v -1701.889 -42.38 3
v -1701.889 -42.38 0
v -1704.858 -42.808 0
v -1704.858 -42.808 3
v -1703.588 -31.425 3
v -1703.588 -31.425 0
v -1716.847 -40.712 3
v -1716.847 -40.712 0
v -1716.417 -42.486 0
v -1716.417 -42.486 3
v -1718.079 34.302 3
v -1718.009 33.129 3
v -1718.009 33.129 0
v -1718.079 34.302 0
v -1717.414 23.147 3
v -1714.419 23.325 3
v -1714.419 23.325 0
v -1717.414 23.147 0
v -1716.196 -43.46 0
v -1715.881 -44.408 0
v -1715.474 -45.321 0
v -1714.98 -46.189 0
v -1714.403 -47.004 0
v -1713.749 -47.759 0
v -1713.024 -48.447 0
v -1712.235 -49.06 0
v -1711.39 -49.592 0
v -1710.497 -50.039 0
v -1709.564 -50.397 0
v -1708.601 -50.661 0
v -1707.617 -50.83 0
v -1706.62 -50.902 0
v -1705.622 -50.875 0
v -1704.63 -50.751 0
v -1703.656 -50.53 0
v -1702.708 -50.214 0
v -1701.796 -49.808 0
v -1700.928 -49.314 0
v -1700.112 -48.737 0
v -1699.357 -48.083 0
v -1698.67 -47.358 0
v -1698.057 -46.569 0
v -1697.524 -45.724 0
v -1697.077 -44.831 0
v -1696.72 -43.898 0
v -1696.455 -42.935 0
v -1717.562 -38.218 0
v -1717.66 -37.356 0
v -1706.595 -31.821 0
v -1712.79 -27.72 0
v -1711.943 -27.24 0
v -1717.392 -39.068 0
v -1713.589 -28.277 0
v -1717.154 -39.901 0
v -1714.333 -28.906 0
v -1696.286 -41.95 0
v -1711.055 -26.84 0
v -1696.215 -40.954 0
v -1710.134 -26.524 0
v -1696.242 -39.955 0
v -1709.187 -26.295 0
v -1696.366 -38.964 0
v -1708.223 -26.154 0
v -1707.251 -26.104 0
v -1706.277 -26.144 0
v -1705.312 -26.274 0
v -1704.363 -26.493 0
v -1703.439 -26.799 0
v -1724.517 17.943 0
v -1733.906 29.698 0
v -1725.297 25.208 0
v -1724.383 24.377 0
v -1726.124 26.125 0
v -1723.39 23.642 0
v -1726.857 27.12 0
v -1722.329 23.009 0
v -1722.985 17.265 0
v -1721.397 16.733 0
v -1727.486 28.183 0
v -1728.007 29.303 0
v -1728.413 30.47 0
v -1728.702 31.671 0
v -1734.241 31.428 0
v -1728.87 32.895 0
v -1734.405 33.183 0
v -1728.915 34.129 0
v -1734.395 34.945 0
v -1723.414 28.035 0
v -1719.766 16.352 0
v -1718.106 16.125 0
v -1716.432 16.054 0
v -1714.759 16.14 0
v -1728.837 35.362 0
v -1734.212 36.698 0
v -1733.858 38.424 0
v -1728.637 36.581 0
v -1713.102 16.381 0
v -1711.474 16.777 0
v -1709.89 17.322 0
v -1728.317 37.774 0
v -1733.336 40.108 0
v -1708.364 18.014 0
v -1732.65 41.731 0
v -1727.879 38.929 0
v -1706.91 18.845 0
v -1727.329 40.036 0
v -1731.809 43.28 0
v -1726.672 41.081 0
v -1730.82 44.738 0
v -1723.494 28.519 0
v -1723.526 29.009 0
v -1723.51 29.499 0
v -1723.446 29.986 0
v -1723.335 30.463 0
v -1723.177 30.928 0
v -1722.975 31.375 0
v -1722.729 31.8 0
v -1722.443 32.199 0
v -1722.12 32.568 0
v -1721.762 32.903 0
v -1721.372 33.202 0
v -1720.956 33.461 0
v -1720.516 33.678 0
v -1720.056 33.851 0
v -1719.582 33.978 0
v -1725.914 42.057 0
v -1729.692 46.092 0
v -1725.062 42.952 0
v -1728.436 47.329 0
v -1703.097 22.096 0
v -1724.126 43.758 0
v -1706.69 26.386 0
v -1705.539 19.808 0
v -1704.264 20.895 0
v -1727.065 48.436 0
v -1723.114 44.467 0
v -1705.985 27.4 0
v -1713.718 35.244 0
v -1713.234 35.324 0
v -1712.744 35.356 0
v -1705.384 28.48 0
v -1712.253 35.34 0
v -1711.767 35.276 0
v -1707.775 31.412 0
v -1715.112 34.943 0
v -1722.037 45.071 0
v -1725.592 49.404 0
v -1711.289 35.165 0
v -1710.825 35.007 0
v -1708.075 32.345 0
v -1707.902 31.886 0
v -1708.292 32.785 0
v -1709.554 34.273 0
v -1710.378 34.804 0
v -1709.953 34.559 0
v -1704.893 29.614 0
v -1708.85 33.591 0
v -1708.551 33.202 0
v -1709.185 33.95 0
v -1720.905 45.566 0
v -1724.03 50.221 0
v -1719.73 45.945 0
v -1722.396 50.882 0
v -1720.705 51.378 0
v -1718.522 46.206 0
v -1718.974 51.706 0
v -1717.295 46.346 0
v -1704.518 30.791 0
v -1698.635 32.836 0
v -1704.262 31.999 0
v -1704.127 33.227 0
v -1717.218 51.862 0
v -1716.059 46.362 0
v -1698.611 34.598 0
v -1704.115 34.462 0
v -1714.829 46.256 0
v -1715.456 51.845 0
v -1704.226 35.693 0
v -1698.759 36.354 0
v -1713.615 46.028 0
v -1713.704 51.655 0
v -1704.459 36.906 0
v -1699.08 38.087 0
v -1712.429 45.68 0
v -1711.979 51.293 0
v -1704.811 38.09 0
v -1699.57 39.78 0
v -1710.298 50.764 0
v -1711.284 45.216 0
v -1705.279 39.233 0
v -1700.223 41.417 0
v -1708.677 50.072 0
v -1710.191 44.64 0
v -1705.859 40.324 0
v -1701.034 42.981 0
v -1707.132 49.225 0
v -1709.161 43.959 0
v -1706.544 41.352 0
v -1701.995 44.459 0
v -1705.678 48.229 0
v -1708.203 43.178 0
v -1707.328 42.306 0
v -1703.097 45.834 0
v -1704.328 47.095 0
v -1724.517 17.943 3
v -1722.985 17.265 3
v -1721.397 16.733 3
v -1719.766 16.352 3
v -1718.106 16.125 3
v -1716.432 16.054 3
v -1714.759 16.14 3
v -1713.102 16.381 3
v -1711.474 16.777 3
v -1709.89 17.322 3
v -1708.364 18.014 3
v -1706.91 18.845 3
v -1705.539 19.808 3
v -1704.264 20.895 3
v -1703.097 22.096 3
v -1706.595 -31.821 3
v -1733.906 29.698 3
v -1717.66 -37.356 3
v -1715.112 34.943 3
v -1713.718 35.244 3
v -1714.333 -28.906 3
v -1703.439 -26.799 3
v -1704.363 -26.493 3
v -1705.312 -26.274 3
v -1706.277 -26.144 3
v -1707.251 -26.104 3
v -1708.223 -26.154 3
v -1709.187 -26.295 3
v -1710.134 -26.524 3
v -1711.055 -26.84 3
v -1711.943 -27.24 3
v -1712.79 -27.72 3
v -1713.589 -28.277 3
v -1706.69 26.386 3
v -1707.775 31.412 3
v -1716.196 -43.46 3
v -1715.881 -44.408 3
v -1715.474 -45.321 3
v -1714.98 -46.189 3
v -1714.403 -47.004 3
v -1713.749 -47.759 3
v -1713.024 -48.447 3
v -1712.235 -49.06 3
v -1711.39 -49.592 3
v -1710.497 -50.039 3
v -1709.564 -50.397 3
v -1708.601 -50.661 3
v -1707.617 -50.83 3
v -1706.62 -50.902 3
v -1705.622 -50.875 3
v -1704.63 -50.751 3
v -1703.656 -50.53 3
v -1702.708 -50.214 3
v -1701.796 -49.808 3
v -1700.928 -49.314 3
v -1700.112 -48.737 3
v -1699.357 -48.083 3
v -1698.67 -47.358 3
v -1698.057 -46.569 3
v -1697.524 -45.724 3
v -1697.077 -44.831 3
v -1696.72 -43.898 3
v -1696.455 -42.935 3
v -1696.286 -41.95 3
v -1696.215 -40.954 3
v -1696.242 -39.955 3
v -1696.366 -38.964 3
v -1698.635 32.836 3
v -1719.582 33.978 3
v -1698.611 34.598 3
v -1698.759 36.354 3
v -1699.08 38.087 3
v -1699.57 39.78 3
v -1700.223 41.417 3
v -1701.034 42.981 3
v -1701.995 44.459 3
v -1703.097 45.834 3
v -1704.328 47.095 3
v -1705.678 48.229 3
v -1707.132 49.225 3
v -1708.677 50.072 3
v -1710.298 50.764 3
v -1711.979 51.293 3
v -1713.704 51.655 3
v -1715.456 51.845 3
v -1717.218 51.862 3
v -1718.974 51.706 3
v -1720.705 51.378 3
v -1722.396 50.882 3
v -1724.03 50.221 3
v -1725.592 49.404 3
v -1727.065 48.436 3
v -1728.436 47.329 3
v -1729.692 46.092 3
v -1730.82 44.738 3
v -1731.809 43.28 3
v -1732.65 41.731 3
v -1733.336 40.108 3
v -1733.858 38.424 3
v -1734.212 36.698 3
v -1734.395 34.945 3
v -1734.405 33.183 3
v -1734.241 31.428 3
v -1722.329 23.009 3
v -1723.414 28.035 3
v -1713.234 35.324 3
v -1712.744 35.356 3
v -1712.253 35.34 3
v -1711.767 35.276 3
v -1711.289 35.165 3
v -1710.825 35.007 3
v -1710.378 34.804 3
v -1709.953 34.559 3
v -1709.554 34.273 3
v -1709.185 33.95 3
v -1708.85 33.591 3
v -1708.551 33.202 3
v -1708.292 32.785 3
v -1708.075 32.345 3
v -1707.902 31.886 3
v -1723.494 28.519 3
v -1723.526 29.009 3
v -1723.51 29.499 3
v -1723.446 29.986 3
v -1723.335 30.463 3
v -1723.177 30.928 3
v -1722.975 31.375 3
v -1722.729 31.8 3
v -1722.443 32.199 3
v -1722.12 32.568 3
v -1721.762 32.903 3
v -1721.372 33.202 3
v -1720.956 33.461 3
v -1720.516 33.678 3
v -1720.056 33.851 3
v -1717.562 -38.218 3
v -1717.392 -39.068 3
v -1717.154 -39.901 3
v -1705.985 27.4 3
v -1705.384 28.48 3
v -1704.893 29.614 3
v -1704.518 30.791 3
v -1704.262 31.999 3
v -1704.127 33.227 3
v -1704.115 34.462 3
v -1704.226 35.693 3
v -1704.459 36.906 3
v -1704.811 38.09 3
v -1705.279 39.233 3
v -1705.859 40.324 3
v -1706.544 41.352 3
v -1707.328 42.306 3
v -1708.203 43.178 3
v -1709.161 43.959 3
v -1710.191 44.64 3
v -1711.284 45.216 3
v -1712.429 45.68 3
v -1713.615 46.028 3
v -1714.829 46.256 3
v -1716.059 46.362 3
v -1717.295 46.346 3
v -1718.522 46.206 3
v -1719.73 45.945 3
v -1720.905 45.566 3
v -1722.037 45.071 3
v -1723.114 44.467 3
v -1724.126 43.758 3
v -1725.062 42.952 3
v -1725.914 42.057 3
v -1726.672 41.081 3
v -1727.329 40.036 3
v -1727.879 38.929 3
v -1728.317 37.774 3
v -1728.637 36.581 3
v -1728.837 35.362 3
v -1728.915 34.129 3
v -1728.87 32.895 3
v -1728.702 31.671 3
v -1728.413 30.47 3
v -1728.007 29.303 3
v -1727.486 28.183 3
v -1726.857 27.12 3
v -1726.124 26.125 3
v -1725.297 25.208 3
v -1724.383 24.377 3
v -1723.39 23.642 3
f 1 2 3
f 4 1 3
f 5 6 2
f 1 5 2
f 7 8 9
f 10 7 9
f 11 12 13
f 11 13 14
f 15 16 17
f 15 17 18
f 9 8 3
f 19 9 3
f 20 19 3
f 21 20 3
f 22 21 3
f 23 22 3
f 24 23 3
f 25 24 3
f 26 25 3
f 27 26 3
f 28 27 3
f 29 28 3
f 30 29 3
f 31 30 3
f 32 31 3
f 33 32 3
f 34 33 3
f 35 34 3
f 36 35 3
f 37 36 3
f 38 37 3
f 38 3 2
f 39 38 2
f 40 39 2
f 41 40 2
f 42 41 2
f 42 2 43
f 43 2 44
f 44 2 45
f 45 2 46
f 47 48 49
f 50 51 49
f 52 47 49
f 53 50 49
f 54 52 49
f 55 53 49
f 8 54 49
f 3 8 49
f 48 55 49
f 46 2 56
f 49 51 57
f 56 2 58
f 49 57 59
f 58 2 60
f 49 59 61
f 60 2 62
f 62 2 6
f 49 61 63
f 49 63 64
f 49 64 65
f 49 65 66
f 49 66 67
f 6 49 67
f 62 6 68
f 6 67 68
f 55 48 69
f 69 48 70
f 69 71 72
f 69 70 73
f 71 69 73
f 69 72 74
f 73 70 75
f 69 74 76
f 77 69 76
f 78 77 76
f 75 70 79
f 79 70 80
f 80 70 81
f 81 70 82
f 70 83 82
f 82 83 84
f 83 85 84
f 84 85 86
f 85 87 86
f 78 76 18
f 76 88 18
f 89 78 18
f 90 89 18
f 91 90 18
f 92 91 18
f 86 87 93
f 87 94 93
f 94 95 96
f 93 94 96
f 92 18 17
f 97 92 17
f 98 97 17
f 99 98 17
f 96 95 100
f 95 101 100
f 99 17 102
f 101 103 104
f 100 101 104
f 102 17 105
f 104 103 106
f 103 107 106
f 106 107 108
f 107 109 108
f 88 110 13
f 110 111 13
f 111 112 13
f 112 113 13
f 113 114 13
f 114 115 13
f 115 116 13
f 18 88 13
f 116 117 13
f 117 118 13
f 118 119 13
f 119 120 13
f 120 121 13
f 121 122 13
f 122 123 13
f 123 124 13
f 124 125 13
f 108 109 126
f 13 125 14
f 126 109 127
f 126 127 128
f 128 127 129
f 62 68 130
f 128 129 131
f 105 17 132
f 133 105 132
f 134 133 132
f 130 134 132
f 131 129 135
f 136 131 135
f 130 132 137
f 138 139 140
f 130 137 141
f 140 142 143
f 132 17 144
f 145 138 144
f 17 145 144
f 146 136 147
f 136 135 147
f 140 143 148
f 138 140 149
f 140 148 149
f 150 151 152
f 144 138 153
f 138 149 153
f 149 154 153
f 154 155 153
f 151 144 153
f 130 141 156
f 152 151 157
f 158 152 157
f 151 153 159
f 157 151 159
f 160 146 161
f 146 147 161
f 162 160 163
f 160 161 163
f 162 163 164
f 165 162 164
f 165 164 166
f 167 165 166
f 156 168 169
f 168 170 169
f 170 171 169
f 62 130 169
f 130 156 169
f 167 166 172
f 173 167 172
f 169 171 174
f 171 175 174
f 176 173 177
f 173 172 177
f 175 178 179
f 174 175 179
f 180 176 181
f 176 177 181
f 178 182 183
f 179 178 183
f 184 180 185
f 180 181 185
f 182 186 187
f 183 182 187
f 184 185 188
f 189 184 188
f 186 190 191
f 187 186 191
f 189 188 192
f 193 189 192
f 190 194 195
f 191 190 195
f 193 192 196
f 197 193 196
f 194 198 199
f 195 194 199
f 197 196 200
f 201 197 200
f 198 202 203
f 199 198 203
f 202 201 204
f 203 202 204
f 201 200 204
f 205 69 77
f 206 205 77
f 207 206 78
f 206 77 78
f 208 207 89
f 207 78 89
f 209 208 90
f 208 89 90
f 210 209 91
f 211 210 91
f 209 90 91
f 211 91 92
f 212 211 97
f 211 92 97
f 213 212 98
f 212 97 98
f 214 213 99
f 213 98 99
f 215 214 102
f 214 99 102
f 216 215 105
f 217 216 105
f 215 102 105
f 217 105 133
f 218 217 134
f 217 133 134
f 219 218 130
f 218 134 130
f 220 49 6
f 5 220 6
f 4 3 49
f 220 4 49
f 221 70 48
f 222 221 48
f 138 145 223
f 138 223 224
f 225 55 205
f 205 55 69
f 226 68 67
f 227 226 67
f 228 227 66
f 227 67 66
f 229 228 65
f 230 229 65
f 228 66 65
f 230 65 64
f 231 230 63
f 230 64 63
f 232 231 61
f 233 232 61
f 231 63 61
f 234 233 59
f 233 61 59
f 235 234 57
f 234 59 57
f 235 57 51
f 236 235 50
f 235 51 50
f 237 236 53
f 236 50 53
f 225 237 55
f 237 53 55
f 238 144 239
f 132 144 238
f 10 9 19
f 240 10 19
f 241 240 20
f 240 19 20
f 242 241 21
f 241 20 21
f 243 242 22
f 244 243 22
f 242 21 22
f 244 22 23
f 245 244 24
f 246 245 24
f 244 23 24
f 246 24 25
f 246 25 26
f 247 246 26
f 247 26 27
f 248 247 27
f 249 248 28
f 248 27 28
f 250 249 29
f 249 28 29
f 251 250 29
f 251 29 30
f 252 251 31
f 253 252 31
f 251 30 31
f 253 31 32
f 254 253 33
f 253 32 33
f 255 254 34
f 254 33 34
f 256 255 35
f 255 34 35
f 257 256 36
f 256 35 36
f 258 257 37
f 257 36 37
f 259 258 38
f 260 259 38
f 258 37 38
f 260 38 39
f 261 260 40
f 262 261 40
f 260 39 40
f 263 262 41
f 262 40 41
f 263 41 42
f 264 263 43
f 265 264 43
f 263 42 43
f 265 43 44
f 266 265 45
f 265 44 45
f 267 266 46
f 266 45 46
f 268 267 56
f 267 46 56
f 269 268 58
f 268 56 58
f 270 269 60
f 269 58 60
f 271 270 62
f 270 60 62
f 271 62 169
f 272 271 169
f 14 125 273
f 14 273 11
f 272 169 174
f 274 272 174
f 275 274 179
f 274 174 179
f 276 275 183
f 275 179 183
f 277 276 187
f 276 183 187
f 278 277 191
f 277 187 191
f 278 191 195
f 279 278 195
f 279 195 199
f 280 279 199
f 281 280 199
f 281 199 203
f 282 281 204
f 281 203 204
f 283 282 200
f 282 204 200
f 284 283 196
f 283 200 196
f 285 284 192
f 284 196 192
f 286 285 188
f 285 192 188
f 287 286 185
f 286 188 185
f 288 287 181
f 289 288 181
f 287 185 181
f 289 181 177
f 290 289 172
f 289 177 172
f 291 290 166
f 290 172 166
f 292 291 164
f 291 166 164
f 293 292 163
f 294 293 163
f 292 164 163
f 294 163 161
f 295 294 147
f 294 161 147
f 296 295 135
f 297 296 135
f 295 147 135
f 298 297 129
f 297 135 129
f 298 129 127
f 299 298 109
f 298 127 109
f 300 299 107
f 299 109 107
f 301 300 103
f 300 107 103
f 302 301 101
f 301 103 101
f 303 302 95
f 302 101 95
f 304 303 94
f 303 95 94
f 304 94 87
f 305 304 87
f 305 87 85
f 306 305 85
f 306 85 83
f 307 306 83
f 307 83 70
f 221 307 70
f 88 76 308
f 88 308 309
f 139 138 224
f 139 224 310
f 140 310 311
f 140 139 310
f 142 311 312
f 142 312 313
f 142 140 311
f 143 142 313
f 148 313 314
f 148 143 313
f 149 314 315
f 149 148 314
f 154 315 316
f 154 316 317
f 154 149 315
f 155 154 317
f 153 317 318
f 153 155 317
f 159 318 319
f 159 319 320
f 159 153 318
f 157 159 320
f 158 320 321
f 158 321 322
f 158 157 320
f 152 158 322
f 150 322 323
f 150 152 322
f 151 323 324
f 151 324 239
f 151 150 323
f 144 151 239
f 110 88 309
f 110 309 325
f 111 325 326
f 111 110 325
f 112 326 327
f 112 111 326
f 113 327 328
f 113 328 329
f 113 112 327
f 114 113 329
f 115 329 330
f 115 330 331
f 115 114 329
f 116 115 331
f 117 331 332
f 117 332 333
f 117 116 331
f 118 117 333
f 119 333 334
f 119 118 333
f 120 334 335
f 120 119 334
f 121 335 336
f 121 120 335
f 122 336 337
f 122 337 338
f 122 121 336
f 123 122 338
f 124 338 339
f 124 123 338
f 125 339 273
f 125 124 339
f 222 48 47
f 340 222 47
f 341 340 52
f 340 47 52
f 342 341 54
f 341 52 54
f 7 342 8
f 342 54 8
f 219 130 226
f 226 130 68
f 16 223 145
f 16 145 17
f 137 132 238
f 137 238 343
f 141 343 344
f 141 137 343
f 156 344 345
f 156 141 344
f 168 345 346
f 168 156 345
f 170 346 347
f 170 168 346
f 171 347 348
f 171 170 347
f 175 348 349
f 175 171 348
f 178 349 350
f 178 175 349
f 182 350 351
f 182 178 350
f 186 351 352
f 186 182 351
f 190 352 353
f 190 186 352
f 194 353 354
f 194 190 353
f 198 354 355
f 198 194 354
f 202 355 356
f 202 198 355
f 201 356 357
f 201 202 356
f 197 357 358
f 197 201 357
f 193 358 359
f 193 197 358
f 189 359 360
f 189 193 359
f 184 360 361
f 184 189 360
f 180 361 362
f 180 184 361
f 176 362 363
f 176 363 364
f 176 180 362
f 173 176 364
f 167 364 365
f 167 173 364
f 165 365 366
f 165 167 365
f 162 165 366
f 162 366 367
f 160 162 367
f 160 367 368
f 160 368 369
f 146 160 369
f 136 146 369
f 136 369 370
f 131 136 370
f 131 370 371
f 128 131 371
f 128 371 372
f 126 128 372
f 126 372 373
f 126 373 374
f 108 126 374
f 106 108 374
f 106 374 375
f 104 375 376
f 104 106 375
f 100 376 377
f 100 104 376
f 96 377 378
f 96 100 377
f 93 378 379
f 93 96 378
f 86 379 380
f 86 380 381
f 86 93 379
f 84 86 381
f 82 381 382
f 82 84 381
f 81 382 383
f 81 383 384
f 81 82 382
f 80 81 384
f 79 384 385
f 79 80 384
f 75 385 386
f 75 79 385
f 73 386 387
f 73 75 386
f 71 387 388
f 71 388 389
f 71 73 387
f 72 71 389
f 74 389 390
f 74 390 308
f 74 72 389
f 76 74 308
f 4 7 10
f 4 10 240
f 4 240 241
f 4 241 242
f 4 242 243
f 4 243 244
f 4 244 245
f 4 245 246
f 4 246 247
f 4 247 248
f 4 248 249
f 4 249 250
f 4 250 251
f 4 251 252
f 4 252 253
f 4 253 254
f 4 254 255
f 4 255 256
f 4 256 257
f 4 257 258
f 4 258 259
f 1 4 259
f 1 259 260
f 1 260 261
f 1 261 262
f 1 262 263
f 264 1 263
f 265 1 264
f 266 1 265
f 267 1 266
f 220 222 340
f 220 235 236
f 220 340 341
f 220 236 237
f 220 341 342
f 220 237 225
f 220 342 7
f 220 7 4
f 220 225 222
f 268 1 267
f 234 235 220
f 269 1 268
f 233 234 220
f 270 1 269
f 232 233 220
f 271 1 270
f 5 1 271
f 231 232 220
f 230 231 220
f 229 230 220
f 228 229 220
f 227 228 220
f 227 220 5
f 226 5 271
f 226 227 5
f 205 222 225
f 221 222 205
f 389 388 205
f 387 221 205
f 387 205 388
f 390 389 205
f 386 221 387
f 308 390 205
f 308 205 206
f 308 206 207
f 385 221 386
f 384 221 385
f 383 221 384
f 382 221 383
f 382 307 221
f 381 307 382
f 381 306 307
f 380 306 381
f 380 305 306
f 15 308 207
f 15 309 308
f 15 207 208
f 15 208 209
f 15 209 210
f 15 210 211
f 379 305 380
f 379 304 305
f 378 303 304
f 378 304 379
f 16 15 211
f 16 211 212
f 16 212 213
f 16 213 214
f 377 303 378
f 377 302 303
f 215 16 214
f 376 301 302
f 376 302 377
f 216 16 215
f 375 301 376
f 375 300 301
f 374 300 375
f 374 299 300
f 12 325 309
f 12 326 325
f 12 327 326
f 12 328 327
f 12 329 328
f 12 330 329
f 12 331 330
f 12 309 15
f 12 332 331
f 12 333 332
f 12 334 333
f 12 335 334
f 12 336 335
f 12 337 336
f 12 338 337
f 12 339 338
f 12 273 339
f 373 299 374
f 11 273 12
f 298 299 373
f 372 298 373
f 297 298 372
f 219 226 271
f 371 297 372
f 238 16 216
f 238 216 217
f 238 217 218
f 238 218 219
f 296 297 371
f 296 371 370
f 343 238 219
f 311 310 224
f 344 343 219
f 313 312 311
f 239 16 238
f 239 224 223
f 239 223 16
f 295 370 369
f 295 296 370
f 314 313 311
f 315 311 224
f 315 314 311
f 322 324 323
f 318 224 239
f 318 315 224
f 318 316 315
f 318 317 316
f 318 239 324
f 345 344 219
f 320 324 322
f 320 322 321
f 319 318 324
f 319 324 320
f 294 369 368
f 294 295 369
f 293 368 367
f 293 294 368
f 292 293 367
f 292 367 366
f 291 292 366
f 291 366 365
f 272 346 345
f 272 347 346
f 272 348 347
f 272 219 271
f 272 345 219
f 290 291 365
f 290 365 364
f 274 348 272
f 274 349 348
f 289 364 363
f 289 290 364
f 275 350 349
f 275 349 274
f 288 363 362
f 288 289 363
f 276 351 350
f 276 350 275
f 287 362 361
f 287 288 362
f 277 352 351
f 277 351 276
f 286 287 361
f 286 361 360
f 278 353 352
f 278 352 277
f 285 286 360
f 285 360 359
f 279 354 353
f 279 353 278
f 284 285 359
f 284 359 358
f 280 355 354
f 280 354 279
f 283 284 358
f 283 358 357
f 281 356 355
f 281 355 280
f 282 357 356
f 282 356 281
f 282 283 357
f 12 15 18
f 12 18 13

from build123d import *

# Parameters (mm, degrees)
BASE_EXTRUDE_DEPTH = 3
CUT_EXTRUDE2_DEPTH = 98
CUT_EXTRUDE6_DEPTH = 32


with BuildPart() as part:
    # Sketch1 → Base-Extrude (new body)
    with BuildSketch(Plane.XY):
        with BuildLine():
            Line((-1733.906004377, 29.697699618), (-1717.660054383, -37.356142617))
            ThreePointArc((-1717.660054383, -37.356142617), (-1717.392491193, -39.067926894), (-1716.846904921, -40.712351137))
            Line((-1716.846904921, -40.712351137), (-1716.417156793, -42.486101711))
            ThreePointArc((-1716.417156793, -42.486101711), (-1704.630486547, -50.750700002), (-1696.365888256, -38.964029756))
            Line((-1696.365888256, -38.964029756), (-1698.635055574, 32.835792941))
            ThreePointArc((-1698.635055574, 32.835792941), (-1718.097908318, 51.805768332), (-1733.906004377, 29.697699618))
        make_face()
        with BuildLine():
            Line((-1703.09668856, 22.095884858), (-1703.438627674, -26.79881214))
            ThreePointArc((-1703.438627674, -26.79881214), (-1709.186992556, -26.294688909), (-1714.332729754, -28.906054021))
            Line((-1714.332729754, -28.906054021), (-1724.517294461, 17.943098305))
            ThreePointArc((-1724.517294461, 17.943098305), (-1713.101655099, 16.381275869), (-1703.09668856, 22.095884858))
        make_face(mode=Mode.SUBTRACT)
        with BuildLine():
            Line((-1719.582465885, 33.977627673), (-1713.717650395, 35.244094915))
            ThreePointArc((-1713.717650395, 35.244094915), (-1709.952658337, 34.558897322), (-1707.774914786, 31.412138042))
            Line((-1707.774914786, 31.412138042), (-1706.689581956, 26.386128223))
            ThreePointArc((-1706.689581956, 26.386128223), (-1719.129096181, 46.090906116), (-1722.329089928, 23.008882245))
            Line((-1722.329089928, 23.008882245), (-1723.414422758, 28.034892064))
            ThreePointArc((-1723.414422758, 28.034892064), (-1722.729225165, 31.799884122), (-1719.582465885, 33.977627673))
        make_face(mode=Mode.SUBTRACT)
    extrude(amount=BASE_EXTRUDE_DEPTH)

    # Sketch2 → Cut-Extrude2 (cut)
    with BuildSketch(Plane.XY.offset(3)):
        Polygon((-1715.450740146, 40.629639019), (-1714.419013149, 23.325108151), (-1717.413695187, 23.146559866), (-1718.008856137, 33.128833327), (-1718.445422184, 40.451090735), align=None)
    extrude(amount=-CUT_EXTRUDE2_DEPTH, mode=Mode.SUBTRACT)

    # Sketch4 → Cut-Extrude6 (cut)
    with BuildSketch(Plane(origin=(0, 0, 0), x_dir=(-1, 0, 0), z_dir=(0, 0, -1))):
        Polygon((1704.858484276, -42.808076116), (1706.594681007, -31.821068487), (1703.587915488, -31.424502176), (1701.889253436, -42.379510814), align=None)
    extrude(amount=-CUT_EXTRUDE6_DEPTH, mode=Mode.SUBTRACT)


solid = part.part
